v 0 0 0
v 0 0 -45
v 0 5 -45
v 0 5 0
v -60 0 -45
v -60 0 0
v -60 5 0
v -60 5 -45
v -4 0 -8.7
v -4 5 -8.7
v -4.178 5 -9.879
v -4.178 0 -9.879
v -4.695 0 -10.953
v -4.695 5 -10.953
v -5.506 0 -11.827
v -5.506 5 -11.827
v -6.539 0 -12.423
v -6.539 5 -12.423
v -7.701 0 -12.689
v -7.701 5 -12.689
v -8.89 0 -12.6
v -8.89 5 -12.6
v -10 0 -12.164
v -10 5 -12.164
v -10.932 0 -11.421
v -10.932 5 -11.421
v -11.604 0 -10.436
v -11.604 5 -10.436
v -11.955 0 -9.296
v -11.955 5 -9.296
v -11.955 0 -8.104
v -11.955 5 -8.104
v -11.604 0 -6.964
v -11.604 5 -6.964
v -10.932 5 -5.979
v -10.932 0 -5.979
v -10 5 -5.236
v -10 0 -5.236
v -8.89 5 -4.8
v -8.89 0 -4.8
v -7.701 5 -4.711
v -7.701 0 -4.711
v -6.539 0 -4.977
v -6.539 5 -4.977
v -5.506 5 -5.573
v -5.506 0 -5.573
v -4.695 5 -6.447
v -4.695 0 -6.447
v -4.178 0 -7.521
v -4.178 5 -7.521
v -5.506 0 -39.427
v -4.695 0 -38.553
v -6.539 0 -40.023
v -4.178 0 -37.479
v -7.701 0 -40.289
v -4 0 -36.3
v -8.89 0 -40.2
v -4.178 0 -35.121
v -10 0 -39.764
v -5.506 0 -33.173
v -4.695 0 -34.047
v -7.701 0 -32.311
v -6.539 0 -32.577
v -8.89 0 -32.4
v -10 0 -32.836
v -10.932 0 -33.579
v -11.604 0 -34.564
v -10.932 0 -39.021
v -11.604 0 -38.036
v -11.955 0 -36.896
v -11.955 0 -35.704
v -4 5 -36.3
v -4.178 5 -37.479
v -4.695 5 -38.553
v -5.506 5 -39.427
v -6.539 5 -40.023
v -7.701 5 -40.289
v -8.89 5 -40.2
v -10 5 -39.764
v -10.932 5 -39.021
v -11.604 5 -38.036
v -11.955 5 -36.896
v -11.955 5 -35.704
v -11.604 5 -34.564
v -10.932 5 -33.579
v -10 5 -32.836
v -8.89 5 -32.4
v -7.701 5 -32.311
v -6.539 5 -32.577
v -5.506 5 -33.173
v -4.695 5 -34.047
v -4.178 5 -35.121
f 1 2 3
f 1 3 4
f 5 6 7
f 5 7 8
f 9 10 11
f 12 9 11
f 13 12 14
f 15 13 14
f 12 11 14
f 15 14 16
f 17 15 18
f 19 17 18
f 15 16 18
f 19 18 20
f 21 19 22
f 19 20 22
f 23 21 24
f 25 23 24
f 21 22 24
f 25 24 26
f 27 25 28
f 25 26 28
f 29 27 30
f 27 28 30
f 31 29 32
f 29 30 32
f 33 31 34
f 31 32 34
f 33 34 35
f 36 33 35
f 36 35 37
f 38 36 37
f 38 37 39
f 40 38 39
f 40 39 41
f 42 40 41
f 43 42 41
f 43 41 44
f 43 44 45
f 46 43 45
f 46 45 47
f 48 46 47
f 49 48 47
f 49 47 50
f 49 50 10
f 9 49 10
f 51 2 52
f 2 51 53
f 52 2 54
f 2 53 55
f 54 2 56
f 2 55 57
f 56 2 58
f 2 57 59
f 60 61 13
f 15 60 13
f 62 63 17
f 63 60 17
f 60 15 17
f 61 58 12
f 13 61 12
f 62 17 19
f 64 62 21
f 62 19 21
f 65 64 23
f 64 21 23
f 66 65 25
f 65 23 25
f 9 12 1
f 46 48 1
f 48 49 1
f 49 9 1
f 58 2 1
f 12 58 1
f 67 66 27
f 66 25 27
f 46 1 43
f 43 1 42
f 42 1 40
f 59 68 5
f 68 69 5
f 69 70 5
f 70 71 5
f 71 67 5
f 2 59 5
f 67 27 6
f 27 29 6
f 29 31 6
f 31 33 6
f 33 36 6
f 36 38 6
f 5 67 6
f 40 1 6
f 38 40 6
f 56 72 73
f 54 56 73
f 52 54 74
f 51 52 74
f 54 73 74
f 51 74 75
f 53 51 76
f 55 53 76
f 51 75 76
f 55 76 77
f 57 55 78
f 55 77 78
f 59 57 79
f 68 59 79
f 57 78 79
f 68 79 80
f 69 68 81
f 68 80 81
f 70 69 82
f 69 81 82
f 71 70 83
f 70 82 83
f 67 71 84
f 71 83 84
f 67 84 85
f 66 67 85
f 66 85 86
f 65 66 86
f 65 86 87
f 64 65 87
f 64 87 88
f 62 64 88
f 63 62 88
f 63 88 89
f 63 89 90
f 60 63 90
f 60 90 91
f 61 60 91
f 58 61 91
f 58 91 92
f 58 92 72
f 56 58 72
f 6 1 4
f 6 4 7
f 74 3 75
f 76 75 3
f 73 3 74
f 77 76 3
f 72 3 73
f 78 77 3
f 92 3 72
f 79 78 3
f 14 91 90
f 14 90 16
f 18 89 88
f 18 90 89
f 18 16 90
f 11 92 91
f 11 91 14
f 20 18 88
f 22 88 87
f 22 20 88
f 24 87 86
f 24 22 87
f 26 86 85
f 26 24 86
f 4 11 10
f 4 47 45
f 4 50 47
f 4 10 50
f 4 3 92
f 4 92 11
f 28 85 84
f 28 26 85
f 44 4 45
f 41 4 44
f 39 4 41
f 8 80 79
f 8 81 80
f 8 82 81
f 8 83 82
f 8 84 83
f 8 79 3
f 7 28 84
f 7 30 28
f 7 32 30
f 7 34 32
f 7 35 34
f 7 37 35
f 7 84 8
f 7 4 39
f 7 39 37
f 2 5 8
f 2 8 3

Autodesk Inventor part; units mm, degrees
ref_plane "YZ Plane" through (0, 0, 0) normal (1, 0, 0) x (0, 1, 0)
ref_plane "XZ Plane" through (0, 0, 0) normal (0, 1, 0) x (-1, 0, 0)
ref_plane "XY Plane" through (0, 0, 0) normal (0, 0, 1) x (1, 0, 0)
sketch "Sketch1" plane through (0, 0, 0) normal (0, 1, 0) x (-1, 0, 0)
  line L0 (0, 0) -> (60, 0)
  line L1 (60, 0) -> (60, -45)
  line L2 (60, -45) -> (0, -45)
  line L3 (0, -45) -> (0, 0)
  dimension "d0" = 60
  dimension "d1" = 45
extrude "Extrusion1" add sketch "Sketch1" along normal blind 5
sketch "Sketch2" plane through (0, 5, 0) normal (0, 1, 0) x (1, 0, 0)
  line L0 (-60, 0) -> (0, 0) projected
  line L1 (0, 0) -> (0, 45) projected
  line L2 (0, 45) -> (-60, 45) projected
  line L3 (-60, 45) -> (-60, 0) projected
  circle A0 centre (-8, 36.3) radius 4
  line L4 (-24.9532, 22.5) -> (-60, 22.5)
  circle A1 centre (-8, 8.7) radius 4
  dimension "d5" = 45
  dimension "d7" = 8
  dimension "d8" = 8.7
  dimension "d10" = 8
extrude "Extrusion3" cut sketch "Sketch2" against normal up to next contours A0 | A1
equation "\"d7\" = d4"
equation "\"d10\" = d9"
equation "\"d6\" = d4"
equation "\"d9\" = d6"
equation "\"d4\" = 8"
properties part number "MotorFixer"
